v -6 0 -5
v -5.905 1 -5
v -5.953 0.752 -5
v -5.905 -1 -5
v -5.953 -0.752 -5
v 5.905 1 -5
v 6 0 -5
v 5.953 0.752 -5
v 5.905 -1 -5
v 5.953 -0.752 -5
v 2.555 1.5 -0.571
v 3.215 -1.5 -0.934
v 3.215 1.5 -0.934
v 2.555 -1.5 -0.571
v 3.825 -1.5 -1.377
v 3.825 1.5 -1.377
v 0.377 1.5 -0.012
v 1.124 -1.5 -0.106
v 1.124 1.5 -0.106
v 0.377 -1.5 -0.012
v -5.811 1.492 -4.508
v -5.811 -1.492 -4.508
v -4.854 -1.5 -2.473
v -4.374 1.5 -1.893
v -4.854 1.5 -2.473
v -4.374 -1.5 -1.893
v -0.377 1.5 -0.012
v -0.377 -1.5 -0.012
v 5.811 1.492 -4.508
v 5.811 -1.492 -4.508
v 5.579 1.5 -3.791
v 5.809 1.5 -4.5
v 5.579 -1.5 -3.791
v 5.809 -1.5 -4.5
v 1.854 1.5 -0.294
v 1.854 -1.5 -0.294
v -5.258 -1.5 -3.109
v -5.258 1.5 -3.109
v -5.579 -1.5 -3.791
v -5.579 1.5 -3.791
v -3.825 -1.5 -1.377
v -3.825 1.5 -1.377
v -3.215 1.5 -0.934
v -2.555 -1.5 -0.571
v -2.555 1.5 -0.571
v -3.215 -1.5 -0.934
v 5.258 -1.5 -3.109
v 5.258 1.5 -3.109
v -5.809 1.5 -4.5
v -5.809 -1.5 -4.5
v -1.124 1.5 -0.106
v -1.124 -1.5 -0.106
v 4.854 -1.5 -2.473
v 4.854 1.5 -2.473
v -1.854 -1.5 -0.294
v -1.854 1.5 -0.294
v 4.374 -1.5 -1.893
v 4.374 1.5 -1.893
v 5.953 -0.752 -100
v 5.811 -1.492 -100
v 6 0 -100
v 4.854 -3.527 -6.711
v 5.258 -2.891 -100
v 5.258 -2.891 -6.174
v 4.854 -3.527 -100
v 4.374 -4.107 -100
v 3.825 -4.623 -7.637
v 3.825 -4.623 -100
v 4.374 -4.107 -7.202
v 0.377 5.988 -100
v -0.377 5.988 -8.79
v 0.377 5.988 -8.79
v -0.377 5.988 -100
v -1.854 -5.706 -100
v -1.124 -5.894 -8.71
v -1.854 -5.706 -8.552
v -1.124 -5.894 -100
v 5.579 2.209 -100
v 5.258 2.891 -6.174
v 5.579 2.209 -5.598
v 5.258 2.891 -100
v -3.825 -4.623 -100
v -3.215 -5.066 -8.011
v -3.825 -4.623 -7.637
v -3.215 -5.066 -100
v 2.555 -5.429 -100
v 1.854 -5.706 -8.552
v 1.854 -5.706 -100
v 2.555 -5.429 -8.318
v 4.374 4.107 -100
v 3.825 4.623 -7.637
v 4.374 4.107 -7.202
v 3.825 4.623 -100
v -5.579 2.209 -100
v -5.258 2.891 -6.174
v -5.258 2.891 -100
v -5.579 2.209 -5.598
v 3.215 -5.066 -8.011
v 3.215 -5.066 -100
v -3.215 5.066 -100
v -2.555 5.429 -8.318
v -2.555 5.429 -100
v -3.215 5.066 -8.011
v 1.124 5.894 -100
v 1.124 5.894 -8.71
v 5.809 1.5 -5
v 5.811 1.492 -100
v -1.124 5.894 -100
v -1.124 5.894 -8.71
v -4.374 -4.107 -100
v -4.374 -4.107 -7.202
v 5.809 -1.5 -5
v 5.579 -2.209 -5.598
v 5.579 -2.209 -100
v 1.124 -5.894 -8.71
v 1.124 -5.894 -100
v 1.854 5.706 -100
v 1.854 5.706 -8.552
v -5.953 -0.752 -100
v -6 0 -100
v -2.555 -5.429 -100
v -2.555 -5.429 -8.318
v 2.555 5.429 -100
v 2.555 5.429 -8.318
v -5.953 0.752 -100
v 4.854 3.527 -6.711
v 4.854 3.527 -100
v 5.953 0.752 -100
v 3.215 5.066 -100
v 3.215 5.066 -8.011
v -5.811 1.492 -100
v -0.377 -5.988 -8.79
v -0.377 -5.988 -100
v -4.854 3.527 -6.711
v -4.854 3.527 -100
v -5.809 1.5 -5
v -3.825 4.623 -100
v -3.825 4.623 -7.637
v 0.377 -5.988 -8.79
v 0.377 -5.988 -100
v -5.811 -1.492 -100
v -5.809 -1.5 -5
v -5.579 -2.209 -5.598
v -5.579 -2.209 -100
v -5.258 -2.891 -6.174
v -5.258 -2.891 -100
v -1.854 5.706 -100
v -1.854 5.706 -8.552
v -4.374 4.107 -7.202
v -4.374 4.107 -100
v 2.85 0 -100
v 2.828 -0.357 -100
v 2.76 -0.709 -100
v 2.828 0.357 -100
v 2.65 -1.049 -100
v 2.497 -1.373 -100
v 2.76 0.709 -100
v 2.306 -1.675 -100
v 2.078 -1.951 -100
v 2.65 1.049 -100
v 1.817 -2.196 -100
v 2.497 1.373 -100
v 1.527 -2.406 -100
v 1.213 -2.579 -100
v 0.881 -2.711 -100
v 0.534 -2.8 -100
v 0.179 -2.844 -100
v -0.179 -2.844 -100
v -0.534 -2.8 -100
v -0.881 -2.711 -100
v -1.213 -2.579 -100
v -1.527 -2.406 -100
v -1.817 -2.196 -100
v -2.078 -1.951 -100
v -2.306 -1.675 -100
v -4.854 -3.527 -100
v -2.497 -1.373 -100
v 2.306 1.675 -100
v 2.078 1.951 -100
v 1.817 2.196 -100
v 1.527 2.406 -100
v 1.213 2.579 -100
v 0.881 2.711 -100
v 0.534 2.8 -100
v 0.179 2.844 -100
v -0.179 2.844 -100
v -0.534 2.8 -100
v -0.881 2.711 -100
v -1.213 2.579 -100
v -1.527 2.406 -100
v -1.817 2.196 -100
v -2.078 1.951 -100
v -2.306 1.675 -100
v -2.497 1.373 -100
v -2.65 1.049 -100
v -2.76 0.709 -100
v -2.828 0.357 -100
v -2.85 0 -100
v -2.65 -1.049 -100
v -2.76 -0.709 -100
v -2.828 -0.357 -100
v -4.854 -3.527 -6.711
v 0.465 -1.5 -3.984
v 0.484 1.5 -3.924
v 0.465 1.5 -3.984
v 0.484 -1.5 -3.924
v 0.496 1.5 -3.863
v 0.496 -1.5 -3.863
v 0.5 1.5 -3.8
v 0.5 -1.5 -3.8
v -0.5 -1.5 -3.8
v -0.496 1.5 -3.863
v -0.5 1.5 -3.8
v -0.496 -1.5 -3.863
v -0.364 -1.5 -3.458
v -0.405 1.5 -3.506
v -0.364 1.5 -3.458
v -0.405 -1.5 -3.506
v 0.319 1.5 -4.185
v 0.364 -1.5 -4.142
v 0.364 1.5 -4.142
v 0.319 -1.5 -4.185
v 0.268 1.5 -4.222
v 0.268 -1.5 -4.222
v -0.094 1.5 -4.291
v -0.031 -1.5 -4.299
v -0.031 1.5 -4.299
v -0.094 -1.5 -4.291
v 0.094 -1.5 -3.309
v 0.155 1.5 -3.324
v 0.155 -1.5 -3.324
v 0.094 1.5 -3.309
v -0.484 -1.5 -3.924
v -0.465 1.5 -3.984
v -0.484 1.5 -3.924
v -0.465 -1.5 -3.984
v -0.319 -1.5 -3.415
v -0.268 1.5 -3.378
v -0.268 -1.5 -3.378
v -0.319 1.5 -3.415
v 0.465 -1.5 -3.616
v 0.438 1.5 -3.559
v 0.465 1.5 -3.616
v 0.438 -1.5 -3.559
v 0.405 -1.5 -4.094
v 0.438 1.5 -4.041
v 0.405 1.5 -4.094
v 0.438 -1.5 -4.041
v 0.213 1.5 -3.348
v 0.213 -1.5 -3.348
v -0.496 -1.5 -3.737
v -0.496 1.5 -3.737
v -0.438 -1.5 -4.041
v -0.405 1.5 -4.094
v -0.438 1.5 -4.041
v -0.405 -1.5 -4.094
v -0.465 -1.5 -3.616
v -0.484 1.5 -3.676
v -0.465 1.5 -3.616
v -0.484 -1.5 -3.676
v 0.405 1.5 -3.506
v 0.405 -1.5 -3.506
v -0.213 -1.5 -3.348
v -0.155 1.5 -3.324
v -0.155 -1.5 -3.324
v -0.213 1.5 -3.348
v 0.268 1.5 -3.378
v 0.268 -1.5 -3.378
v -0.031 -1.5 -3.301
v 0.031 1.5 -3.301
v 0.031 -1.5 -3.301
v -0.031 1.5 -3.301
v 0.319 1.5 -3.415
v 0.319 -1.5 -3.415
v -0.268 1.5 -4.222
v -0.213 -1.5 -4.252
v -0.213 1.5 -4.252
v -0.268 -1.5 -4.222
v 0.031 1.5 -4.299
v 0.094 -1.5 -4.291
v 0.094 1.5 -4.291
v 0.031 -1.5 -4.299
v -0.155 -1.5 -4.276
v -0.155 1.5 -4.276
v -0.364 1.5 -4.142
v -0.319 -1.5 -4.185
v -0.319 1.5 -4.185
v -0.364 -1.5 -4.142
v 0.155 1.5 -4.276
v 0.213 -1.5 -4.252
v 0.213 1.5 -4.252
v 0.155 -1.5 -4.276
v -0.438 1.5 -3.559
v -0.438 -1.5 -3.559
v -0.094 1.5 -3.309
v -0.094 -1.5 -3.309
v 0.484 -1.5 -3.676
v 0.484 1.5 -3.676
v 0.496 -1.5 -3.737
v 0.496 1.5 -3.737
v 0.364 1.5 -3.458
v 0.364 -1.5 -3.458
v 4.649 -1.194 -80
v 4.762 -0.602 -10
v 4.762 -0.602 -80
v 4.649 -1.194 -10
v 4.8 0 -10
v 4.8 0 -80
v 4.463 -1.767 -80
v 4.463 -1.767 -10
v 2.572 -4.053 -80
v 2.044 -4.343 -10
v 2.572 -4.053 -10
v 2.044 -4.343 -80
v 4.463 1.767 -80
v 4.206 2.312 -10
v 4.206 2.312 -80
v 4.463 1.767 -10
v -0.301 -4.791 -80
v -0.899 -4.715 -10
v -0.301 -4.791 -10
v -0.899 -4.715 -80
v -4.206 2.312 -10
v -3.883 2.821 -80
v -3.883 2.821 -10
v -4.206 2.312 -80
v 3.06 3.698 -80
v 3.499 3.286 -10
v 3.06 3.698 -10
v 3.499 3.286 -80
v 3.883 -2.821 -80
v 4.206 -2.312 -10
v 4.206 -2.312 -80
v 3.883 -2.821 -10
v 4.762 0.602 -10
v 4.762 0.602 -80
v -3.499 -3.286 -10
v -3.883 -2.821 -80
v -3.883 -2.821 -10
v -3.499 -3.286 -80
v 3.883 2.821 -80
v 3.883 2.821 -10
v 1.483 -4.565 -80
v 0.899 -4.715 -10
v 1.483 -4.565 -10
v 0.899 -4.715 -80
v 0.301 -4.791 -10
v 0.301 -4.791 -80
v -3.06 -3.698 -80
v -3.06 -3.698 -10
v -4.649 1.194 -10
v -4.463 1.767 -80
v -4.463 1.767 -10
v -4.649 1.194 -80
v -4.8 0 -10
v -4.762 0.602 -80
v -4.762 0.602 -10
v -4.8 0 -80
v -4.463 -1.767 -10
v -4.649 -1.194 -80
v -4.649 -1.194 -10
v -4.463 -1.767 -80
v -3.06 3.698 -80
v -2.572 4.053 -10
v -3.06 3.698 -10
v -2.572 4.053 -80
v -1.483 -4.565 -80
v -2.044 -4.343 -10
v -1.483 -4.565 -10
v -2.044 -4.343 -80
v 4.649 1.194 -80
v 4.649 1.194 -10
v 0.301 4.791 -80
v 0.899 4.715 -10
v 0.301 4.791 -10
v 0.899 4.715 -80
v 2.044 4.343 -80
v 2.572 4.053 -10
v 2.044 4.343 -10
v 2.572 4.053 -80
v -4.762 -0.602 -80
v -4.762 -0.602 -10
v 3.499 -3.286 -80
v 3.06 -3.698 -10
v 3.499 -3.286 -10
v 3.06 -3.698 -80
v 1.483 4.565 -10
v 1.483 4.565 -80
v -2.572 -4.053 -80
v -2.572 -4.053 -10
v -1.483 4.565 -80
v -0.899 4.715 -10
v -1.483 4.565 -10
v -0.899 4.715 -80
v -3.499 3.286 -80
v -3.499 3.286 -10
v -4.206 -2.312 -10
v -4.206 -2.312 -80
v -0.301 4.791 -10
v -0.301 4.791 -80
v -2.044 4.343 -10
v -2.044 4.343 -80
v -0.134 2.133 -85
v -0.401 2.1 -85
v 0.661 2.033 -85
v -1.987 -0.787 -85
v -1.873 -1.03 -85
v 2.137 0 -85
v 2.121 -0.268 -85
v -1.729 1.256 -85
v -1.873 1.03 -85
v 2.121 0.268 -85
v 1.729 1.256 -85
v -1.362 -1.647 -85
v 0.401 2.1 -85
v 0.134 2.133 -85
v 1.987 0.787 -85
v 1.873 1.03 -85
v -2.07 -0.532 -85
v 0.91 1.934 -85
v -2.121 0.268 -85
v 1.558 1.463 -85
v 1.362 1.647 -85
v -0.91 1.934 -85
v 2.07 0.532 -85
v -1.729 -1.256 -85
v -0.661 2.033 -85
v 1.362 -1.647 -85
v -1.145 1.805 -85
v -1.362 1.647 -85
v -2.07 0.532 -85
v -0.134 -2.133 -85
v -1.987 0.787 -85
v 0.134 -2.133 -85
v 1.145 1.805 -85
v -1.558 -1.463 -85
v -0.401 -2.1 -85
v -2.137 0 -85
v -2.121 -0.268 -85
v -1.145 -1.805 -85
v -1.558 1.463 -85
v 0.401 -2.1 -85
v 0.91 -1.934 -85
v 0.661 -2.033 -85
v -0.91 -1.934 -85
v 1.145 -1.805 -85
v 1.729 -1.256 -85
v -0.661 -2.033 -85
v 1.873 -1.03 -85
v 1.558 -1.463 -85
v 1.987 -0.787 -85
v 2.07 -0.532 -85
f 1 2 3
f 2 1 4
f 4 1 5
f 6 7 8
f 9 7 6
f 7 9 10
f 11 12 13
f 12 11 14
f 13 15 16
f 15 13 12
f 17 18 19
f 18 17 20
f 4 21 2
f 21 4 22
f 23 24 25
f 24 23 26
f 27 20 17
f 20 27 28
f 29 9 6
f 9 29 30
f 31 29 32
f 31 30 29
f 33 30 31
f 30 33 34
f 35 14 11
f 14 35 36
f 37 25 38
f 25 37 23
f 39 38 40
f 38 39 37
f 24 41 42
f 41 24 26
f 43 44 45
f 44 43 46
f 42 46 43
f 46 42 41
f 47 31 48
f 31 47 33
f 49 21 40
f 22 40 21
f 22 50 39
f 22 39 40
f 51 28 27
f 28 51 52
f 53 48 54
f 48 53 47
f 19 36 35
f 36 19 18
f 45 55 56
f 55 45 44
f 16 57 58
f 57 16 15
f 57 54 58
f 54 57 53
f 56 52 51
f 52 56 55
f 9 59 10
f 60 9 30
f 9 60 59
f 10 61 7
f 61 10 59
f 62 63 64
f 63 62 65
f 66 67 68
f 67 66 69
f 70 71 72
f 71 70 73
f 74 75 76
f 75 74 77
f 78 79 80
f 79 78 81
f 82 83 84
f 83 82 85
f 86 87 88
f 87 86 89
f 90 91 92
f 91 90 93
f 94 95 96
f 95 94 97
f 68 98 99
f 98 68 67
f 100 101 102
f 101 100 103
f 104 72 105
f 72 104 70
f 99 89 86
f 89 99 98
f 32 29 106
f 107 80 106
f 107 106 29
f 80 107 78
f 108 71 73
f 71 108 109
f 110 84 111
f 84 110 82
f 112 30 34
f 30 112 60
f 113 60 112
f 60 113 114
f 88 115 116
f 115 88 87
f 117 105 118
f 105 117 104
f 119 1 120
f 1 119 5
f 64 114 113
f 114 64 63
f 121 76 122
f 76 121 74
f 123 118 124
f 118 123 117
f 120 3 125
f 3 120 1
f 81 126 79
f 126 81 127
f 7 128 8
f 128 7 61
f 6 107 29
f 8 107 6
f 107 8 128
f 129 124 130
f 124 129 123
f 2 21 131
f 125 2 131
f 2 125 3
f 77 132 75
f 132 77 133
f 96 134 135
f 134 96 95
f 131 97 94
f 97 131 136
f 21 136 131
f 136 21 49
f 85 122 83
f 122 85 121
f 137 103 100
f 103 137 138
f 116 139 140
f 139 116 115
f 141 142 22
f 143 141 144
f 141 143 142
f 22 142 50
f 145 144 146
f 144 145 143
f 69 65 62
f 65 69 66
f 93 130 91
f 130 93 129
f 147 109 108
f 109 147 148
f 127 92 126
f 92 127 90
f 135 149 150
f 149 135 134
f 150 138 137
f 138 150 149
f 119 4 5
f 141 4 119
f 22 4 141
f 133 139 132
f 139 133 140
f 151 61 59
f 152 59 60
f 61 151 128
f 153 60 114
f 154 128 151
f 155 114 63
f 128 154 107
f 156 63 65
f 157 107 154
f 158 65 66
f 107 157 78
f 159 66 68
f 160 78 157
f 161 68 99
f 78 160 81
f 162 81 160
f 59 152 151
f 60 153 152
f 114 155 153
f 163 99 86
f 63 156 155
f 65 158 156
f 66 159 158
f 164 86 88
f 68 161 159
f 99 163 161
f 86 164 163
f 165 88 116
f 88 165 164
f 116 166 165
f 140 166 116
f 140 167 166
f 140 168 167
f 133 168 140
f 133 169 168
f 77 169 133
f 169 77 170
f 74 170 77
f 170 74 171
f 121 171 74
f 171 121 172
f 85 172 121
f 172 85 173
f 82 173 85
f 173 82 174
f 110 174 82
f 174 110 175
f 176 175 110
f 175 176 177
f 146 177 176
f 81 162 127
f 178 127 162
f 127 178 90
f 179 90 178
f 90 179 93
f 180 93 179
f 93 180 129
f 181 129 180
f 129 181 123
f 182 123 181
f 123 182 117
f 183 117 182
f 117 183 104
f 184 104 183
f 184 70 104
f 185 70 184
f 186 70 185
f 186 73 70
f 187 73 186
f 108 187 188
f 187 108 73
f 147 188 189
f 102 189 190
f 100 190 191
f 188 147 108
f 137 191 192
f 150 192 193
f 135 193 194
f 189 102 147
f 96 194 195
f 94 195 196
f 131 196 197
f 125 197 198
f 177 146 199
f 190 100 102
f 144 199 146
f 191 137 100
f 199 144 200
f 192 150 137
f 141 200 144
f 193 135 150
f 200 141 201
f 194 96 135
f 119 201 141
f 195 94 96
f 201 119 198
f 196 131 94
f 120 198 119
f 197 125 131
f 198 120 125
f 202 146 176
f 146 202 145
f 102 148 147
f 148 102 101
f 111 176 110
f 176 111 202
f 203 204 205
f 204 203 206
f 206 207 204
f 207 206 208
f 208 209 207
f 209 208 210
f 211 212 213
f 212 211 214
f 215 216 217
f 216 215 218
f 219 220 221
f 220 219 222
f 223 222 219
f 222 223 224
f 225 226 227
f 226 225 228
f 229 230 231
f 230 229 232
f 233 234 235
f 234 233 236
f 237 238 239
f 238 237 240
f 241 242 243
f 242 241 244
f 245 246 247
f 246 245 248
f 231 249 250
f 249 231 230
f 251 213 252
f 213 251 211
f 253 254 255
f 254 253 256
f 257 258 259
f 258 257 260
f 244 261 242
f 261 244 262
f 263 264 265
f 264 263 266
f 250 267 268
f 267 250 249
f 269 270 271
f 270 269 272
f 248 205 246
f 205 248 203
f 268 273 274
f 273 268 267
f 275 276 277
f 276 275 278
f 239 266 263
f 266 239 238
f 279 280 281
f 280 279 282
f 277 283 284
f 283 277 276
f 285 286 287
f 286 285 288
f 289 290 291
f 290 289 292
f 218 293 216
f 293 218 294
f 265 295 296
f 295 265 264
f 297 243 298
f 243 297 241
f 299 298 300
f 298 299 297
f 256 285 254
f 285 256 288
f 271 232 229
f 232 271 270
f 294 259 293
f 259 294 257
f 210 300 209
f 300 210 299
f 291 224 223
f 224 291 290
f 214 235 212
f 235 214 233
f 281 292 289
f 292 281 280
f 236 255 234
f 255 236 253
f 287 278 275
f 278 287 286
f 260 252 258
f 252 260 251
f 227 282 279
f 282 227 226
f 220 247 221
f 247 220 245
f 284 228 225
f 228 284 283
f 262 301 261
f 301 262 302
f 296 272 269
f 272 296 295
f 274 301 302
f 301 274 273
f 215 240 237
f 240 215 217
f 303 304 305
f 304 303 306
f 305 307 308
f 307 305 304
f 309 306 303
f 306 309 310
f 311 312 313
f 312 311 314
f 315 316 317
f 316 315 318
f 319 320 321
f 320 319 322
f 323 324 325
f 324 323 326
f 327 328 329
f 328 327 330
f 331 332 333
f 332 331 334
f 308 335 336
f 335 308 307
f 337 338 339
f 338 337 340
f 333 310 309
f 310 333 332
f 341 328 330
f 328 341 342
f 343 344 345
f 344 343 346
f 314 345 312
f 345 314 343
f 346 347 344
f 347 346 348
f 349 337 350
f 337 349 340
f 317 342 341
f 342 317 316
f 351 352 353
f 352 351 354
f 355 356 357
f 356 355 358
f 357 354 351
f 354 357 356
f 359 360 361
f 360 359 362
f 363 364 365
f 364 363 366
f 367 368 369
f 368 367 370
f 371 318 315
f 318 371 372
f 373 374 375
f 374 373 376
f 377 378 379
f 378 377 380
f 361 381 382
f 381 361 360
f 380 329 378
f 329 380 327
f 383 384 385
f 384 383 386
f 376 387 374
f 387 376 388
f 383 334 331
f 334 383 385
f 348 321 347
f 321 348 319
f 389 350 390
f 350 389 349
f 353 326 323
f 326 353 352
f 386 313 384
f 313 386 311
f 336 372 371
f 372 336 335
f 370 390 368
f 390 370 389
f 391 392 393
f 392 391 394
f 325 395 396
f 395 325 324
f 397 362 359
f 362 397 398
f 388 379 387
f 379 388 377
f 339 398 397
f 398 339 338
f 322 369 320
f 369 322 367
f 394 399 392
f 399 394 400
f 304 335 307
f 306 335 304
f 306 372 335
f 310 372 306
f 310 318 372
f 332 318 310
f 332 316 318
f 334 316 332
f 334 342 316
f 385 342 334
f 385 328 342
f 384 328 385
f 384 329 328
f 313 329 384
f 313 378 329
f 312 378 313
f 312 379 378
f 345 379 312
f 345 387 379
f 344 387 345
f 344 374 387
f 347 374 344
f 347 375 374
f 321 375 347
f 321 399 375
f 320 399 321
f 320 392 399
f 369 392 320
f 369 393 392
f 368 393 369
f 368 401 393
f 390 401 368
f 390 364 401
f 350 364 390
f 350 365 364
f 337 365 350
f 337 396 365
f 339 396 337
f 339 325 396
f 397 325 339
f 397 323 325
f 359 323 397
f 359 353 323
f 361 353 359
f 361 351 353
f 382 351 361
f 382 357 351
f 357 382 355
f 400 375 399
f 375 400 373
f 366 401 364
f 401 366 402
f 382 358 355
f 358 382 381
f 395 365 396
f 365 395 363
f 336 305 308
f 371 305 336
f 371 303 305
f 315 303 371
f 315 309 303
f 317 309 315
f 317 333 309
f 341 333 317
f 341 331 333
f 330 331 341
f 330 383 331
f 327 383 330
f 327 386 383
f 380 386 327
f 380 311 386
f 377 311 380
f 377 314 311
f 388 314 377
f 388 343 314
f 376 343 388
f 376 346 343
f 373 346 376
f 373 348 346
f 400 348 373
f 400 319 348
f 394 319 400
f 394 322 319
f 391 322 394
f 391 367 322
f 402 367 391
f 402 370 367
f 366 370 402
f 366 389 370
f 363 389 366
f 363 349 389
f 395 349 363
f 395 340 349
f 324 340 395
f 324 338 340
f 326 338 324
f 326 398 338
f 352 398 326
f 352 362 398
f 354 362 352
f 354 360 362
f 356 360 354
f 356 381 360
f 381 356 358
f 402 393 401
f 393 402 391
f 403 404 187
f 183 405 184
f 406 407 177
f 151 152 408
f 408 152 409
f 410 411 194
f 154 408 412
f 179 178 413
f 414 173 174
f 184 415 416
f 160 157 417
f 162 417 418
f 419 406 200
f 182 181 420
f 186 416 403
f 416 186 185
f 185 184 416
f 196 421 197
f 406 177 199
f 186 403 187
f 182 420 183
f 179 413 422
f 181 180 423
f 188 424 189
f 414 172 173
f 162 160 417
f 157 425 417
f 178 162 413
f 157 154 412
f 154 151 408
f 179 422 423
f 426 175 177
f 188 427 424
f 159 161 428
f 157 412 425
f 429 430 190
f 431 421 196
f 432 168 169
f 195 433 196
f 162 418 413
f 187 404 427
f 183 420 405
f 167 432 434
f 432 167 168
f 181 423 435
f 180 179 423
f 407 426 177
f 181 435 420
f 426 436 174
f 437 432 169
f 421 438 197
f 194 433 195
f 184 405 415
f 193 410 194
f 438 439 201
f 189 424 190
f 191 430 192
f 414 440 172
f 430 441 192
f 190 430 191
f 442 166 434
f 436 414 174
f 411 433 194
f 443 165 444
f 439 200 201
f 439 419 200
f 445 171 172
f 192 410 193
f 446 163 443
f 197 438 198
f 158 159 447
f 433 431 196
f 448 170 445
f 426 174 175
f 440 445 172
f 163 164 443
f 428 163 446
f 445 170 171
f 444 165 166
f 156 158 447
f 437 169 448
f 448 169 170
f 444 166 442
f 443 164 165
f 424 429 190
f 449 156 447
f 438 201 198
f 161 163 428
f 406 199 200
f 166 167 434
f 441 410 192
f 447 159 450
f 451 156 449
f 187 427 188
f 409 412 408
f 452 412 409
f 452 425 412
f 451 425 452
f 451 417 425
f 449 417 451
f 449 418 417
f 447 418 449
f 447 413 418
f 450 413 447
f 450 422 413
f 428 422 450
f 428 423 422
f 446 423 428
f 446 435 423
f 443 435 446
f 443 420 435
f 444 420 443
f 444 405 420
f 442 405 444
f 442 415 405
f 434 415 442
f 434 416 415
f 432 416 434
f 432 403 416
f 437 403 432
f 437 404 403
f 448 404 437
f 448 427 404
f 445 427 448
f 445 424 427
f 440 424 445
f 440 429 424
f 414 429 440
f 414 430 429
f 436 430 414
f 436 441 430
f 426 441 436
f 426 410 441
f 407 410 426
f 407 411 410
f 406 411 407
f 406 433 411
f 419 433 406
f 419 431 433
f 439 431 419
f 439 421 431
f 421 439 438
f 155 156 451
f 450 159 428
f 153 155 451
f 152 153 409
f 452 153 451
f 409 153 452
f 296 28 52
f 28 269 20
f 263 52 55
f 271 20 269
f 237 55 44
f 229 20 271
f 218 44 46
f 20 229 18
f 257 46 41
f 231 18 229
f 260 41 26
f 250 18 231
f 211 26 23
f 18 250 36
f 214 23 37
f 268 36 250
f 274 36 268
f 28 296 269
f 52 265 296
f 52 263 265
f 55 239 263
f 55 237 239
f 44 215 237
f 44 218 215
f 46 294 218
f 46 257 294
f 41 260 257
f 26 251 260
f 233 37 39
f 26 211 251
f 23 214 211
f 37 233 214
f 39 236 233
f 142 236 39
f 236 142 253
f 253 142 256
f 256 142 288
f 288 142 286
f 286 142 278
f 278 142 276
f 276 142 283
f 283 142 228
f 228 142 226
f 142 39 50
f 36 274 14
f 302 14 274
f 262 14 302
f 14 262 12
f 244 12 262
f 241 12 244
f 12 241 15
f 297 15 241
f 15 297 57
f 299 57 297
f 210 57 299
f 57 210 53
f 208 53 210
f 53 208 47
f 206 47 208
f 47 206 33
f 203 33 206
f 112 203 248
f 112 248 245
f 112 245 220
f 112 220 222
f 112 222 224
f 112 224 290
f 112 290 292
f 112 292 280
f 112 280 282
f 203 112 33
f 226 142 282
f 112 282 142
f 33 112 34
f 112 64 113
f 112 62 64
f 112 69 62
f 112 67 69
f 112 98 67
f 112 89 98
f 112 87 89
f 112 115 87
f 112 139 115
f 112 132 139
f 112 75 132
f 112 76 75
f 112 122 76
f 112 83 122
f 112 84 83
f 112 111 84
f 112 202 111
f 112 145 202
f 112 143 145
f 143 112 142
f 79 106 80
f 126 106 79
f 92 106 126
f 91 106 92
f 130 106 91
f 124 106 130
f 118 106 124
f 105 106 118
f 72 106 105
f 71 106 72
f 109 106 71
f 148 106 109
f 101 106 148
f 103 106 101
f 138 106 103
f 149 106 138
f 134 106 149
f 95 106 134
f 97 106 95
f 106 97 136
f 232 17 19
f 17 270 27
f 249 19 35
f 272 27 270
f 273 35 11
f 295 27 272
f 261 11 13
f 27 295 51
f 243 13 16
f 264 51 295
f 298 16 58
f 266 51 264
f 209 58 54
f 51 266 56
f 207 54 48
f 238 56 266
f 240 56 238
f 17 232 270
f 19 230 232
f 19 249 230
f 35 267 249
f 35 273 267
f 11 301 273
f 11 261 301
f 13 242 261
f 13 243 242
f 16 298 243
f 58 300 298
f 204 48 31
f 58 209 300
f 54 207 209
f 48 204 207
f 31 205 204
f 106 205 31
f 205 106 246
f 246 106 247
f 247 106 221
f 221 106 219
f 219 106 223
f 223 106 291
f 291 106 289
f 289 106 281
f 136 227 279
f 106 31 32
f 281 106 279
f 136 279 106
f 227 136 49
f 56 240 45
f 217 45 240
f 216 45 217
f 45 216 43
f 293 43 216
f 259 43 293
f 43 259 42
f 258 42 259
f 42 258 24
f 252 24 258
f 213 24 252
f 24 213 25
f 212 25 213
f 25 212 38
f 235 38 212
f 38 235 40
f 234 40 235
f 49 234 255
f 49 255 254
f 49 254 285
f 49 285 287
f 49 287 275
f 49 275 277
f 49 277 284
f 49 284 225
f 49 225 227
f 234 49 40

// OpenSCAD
$fn = 50;

//height
h = 100;
//total radius
r = 6;
//strength (wall thickness)
s = 1.2;
//holes_margin
h_m = 5;

//light mount depth
l_d = 15;
//light radius
l_r = 2.85;
//light radius bottom (smaller because light has to be stuck in)
l_r_b = 0.75 * l_r;

//line hole radius
h_r = 0.5;
//line hole width
h_w =3;

rotate([180,0,0])
difference(){
    cylinder(h,r,r);
    translate([0,r,h_m-s])rotate([90,0,0]) cylinder(2*r,h_r,h_r);
    translate([0,0,h_m*2]) cylinder(h-3*h_m-l_d,r-s,r-s);
    translate([0,0,h-l_d]) cylinder(l_d,l_r_b,l_r);
    translate([r,0,0]) rotate([0,-90,0]) linear_extrude(2*r) polygon([[0,h_w/2],[0,r],[h_m*2-s,r],[h_m,h_w/2]]);
    translate([-r,0,0]) rotate([0,90,0]) rotate([0,0,180]) linear_extrude(2*r) polygon([[0,h_w/2],[0,r],[h_m*2-s,r],[h_m,h_w/2]]);
    
translate([-r,-r,0])
difference(){
    cube([r*2,r*2,h_m]);
    translate([r,r*2,r])rotate([90,0,0])cylinder(r*2,r,r);
}    
}
